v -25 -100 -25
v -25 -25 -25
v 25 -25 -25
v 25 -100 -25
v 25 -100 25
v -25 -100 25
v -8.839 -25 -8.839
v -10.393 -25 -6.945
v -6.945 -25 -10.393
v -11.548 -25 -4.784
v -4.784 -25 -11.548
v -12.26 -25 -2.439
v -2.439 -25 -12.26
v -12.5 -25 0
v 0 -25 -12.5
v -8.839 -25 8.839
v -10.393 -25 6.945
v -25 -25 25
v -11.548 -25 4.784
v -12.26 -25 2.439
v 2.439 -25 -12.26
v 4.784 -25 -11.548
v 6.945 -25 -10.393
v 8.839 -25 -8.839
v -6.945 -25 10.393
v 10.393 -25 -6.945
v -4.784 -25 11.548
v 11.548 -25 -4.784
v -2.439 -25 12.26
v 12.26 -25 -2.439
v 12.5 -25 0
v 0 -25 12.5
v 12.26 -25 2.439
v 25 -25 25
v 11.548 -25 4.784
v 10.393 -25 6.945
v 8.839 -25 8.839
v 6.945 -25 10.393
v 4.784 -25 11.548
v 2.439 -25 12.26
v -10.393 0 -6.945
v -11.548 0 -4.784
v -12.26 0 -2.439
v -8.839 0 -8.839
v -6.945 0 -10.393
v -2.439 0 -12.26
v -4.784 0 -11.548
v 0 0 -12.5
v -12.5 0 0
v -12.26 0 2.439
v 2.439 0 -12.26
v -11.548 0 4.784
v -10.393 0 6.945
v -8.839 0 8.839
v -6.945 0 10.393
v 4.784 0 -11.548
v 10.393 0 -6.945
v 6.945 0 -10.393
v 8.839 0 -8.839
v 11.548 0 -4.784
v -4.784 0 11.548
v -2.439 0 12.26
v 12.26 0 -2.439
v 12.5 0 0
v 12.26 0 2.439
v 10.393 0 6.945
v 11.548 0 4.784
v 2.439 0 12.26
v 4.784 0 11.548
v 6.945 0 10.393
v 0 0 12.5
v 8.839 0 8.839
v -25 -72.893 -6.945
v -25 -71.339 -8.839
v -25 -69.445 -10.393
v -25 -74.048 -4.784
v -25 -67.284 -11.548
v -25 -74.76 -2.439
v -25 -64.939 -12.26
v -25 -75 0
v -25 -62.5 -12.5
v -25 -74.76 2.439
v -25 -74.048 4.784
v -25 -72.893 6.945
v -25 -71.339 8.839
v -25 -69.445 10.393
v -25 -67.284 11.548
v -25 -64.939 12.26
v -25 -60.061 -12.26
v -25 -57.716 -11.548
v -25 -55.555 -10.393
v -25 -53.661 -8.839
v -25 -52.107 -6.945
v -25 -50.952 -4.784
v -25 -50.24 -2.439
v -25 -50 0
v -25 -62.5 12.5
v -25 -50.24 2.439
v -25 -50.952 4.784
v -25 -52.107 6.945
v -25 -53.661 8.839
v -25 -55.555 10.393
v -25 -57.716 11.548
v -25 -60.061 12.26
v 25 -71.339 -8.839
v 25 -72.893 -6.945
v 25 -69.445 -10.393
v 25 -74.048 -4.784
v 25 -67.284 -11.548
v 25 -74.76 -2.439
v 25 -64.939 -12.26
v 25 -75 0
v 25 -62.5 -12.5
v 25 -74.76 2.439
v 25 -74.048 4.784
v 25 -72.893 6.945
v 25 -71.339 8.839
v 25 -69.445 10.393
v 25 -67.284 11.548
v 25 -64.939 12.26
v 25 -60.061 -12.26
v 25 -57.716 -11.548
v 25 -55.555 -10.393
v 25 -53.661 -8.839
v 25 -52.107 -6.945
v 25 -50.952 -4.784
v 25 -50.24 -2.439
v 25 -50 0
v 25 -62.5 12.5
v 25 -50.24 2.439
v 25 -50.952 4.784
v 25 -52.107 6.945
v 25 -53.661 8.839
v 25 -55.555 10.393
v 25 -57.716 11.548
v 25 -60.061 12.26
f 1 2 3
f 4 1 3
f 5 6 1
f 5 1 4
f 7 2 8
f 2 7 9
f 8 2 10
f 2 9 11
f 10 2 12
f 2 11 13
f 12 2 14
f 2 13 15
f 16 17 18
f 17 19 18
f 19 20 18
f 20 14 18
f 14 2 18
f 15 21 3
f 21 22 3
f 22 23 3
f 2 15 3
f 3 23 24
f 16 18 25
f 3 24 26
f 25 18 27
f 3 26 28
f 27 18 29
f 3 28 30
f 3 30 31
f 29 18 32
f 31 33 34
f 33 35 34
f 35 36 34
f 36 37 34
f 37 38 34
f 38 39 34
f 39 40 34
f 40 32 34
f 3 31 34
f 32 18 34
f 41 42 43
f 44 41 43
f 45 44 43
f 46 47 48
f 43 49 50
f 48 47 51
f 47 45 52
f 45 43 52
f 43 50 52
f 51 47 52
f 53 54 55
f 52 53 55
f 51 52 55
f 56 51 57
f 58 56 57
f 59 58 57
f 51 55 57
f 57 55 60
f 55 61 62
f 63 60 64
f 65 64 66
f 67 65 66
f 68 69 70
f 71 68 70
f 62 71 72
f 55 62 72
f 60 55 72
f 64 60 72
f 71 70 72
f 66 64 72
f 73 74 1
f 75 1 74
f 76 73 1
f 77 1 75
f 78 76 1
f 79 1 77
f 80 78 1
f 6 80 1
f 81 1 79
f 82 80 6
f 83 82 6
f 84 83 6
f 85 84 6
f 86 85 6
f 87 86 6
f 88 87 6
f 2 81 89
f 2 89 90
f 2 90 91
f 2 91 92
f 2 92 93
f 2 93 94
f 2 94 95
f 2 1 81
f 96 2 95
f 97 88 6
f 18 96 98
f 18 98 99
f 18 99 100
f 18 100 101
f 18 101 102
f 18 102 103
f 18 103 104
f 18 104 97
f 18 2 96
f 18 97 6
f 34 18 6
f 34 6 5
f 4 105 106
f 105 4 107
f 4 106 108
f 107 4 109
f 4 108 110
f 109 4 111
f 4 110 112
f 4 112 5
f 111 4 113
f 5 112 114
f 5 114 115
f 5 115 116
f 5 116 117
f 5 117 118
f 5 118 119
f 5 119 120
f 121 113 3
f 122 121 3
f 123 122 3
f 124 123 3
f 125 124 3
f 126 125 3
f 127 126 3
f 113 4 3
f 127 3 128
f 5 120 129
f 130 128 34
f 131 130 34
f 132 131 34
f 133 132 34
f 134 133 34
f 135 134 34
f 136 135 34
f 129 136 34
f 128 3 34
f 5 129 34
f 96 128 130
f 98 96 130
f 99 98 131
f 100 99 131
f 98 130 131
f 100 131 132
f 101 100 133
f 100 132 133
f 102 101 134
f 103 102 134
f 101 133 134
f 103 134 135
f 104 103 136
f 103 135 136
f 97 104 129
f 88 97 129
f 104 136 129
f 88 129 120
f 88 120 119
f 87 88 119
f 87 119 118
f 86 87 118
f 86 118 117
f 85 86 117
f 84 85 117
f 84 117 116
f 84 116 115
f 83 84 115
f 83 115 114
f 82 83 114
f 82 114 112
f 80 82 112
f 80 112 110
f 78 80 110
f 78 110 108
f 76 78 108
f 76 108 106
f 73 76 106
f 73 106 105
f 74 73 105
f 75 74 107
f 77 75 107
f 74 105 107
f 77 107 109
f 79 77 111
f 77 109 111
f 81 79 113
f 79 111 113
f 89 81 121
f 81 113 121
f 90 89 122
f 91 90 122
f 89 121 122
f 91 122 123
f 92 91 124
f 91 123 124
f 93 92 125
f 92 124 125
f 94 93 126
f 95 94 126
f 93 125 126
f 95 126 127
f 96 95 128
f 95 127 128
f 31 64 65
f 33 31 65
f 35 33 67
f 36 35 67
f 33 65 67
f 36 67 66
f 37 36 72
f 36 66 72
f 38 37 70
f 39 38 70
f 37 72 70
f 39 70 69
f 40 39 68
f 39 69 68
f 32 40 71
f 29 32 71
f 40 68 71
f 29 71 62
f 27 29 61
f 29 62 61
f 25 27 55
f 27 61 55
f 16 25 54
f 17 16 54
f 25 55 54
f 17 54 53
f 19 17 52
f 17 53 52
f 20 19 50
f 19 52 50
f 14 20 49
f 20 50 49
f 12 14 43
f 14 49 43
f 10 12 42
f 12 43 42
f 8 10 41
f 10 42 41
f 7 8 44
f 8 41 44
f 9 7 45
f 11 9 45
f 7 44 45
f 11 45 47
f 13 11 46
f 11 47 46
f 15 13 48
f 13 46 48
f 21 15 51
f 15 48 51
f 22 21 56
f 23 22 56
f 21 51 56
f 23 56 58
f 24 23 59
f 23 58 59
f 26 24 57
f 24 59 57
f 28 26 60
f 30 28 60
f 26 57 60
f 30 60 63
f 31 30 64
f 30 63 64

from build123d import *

# Parameters (mm, degrees)
F0_R     = 12.5
F1_DEPTH = 25
F2_W     = 50
F2_H     = 50
F2_R     = 12.5
F3_DEPTH = 75
F4_R     = 12.5
F5_DEPTH = 50.001


with BuildPart() as f1:
    # F0 (on Front) → F1 (new body)
    with BuildSketch(Plane.XZ):
        Circle(F0_R)
    extrude(amount=F1_DEPTH)

    # F2 (on face) → F3 (join)
    with BuildSketch(Plane.XZ.offset(25)):
        Rectangle(F2_W, F2_H)
        Circle(F2_R, mode=Mode.SUBTRACT)
        Circle(F2_R)
    extrude(amount=F3_DEPTH)

    # F4 (on face) → F5 (cut, through all)
    with BuildSketch(Plane.YZ.offset(25)):
        with Locations((-62.5, 0)):
            Circle(F4_R)
    extrude(amount=-F5_DEPTH, mode=Mode.SUBTRACT)


solid = f1.part
